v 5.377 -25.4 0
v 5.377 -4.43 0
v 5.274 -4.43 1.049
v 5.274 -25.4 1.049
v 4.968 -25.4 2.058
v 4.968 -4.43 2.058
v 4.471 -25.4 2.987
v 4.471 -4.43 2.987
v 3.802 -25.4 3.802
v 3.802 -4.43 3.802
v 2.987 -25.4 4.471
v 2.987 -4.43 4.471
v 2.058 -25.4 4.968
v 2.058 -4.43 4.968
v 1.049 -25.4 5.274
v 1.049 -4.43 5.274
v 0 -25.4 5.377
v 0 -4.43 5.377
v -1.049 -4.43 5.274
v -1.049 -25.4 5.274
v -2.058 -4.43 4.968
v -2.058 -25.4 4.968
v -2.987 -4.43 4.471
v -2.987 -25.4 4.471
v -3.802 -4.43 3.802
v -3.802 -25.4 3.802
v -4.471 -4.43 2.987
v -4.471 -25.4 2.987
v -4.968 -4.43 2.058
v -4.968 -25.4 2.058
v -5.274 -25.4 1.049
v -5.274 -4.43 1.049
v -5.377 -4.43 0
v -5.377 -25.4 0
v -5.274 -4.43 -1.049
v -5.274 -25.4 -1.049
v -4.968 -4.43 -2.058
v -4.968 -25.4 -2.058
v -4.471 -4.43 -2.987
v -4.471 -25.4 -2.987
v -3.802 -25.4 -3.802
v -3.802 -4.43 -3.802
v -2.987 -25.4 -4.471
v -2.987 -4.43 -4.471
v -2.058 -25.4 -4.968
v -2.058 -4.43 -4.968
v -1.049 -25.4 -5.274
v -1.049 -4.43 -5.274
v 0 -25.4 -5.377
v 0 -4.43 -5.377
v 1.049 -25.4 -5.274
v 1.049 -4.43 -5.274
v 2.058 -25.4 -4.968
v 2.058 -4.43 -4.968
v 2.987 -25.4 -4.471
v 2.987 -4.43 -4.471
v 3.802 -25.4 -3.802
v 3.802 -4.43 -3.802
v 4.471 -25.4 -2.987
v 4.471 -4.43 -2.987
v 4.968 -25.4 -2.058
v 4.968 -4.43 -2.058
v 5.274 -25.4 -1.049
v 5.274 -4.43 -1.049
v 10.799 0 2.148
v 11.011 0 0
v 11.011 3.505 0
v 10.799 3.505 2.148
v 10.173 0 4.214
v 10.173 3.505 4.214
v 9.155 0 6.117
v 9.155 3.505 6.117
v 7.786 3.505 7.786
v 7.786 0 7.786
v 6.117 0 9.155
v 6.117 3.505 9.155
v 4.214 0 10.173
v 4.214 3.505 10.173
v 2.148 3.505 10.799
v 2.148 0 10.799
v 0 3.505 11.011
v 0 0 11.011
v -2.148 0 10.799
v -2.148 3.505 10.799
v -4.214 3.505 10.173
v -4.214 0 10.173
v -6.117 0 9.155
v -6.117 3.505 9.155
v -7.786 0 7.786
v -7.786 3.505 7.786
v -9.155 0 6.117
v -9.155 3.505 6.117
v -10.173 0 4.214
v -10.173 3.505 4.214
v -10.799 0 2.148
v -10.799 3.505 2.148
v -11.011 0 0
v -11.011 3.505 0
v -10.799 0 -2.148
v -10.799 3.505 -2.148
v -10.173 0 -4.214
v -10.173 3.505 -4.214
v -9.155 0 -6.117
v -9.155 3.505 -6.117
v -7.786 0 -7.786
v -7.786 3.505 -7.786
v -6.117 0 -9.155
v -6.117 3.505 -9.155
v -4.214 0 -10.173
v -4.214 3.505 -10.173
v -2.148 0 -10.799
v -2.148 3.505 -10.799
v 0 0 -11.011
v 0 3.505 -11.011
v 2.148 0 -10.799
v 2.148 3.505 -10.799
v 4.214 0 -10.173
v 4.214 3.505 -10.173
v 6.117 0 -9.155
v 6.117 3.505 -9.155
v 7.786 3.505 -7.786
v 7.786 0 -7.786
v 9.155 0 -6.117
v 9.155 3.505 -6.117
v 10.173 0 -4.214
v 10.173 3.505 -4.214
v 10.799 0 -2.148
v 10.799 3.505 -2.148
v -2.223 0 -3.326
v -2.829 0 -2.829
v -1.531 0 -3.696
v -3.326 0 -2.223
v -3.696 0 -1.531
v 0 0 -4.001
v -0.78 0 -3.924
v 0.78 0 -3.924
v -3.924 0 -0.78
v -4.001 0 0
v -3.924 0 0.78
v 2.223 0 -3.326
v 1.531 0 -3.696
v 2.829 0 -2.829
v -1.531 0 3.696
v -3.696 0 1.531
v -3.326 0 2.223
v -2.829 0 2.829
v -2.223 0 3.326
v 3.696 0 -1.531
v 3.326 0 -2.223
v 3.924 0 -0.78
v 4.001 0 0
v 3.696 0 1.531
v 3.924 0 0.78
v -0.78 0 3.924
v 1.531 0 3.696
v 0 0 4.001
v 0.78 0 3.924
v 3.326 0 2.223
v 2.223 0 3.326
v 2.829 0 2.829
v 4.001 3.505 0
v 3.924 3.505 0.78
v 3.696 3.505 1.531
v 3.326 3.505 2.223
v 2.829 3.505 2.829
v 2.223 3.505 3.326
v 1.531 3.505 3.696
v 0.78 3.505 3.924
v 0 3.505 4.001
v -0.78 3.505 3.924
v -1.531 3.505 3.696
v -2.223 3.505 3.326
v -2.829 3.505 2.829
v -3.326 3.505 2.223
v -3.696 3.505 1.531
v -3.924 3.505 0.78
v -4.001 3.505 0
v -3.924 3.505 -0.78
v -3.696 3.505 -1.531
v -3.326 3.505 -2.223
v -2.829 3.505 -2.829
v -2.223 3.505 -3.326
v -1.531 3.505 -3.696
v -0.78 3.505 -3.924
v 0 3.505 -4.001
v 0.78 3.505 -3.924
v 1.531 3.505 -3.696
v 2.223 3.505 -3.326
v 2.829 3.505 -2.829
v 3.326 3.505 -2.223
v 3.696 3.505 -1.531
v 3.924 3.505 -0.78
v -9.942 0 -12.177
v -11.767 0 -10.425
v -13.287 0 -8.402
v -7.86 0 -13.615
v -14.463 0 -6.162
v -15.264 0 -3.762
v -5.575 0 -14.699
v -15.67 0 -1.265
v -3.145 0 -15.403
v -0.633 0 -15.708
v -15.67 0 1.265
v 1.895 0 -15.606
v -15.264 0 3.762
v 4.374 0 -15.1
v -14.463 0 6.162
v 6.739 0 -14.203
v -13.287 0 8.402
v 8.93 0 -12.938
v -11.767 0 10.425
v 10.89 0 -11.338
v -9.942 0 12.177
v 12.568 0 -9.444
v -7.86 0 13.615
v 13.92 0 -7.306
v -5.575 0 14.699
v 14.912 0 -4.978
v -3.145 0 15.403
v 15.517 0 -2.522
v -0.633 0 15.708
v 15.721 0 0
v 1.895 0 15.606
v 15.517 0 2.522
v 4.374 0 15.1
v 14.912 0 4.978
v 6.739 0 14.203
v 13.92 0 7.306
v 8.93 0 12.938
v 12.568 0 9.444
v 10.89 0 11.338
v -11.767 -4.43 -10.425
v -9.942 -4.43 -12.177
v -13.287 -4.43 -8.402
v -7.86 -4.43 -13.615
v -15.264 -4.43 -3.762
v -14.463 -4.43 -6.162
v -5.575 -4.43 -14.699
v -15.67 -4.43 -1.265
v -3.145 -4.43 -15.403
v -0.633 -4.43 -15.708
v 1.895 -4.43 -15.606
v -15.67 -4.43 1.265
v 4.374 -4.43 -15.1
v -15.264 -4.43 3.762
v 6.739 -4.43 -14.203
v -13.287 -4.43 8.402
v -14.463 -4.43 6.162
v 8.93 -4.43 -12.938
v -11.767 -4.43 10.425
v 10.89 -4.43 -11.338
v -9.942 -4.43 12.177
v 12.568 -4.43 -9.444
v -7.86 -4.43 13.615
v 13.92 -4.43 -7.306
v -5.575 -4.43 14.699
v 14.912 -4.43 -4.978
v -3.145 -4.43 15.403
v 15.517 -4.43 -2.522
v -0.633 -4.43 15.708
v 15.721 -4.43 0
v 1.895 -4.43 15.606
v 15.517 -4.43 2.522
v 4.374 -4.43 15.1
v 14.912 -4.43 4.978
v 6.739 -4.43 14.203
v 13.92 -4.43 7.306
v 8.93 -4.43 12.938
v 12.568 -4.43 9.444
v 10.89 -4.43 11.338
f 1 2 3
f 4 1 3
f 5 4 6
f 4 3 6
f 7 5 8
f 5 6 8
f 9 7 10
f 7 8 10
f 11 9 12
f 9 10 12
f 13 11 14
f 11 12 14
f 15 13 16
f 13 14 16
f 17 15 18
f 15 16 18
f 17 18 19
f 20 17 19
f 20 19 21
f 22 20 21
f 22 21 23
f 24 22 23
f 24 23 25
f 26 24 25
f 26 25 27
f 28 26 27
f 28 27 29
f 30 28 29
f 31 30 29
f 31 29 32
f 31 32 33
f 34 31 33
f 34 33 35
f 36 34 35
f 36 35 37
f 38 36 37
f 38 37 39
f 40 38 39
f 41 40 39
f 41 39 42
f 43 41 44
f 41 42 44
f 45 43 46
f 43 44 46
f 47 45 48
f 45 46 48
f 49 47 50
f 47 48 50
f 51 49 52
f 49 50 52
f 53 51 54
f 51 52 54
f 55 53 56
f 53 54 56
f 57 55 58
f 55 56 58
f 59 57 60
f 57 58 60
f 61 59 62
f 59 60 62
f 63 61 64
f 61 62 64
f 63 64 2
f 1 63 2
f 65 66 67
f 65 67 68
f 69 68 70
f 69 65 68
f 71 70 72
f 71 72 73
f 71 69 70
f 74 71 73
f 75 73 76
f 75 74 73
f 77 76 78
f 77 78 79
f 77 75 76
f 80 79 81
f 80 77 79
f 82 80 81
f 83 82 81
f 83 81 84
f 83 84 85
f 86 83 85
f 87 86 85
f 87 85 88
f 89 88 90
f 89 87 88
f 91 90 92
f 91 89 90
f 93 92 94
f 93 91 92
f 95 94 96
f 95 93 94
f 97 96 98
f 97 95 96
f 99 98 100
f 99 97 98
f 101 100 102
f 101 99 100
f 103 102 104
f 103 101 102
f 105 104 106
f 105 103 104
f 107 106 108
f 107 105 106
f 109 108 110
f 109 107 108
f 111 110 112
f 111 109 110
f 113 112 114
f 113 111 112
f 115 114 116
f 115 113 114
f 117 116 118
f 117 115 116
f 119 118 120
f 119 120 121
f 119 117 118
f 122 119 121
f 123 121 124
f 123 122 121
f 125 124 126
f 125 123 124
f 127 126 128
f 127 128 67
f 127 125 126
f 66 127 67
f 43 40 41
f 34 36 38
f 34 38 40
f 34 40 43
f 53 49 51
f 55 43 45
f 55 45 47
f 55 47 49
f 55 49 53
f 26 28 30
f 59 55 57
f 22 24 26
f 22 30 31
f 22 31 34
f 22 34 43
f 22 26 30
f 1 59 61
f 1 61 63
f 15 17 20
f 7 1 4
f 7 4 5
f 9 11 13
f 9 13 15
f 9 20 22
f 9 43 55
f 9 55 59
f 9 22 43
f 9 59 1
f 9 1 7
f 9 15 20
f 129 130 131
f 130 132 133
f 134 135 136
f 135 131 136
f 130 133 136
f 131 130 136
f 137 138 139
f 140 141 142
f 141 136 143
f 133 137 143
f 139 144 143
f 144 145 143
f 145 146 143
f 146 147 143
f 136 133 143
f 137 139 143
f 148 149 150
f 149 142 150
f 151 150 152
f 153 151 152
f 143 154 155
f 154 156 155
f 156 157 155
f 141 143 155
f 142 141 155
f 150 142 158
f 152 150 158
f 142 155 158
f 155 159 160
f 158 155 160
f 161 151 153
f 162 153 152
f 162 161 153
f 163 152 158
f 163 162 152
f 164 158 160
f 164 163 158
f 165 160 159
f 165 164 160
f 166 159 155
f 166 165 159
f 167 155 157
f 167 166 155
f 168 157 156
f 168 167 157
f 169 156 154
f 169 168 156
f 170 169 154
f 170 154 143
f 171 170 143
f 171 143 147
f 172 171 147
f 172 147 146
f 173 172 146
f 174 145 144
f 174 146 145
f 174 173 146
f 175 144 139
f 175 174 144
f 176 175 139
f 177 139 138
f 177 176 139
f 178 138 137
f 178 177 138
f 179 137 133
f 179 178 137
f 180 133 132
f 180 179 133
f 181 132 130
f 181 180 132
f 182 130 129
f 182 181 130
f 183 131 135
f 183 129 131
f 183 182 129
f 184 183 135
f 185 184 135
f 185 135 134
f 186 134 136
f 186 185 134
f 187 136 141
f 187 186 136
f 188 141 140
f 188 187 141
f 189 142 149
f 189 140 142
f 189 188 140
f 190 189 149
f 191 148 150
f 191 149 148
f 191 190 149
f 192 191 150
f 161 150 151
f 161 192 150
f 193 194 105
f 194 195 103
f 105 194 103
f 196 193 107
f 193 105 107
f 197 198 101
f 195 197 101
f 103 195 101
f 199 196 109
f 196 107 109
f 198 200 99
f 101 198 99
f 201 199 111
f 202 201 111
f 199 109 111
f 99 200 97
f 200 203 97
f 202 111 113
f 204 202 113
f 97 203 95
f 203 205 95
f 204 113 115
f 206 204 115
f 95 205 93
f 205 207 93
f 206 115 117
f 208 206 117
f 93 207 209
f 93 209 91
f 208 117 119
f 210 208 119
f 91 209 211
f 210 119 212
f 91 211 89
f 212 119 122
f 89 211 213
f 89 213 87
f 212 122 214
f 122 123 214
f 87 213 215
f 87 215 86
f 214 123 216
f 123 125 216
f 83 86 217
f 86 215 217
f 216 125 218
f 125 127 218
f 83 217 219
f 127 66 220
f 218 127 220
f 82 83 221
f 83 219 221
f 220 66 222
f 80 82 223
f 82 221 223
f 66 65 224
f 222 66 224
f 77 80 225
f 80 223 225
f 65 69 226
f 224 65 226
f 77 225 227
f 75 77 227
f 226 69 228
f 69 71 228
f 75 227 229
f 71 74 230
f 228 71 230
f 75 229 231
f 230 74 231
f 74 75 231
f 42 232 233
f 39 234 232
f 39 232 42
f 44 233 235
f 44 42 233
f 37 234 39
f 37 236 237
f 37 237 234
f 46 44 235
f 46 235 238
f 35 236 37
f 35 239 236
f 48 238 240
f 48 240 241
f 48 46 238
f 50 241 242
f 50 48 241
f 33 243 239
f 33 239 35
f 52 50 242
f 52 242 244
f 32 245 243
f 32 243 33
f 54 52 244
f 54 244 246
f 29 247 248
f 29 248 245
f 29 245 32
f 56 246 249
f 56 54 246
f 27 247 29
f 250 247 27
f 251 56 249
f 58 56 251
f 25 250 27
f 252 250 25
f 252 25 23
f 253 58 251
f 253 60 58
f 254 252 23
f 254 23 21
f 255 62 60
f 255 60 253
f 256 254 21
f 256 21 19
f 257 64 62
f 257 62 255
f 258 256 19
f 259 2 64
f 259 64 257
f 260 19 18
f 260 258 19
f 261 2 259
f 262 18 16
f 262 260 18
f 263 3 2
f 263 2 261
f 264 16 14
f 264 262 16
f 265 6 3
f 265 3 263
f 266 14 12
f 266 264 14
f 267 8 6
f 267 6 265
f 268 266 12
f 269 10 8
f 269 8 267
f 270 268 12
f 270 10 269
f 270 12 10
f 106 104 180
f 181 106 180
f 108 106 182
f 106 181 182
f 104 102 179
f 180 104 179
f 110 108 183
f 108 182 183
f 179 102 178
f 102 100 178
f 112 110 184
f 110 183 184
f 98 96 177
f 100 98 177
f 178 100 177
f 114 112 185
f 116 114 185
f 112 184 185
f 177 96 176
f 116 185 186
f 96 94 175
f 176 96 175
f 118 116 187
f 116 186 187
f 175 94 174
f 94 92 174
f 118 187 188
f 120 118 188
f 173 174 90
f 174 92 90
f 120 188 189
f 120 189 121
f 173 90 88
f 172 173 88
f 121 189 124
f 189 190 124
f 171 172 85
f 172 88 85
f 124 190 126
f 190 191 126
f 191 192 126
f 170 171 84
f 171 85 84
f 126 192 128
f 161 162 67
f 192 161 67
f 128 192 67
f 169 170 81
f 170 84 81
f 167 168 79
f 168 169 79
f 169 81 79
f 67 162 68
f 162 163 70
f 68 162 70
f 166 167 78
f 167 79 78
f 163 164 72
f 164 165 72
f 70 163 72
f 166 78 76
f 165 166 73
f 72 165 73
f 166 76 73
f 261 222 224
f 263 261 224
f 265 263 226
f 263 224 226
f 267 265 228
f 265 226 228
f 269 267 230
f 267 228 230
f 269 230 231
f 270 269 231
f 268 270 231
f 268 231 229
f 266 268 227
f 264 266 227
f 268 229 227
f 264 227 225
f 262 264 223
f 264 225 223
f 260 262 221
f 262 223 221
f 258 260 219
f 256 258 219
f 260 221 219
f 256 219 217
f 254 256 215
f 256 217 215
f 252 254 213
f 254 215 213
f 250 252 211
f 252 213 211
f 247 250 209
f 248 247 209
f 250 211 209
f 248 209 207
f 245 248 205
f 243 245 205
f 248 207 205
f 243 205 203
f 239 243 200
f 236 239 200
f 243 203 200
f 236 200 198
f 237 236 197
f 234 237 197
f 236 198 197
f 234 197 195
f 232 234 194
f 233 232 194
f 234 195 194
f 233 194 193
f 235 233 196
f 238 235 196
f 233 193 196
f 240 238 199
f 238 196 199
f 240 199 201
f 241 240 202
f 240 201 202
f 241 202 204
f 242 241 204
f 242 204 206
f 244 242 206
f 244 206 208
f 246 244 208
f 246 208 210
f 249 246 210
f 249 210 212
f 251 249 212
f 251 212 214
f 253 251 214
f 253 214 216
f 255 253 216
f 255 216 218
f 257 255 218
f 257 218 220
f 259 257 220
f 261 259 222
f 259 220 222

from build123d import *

# Parameters (mm, degrees)
F0_R     = 11.0109
F0_R_2   = 4.0005284671
F1_DEPTH = 3.5052
F2_R     = 15.7206731231
F3_DEPTH = 4.43
F4_R     = 5.3773289571
F5_DEPTH = 25.4


with BuildPart() as f1:
    # F0 (on Front) → F1 (new body, symmetric)
    with BuildSketch(Plane.XZ):
        Circle(F0_R)
        Circle(F0_R_2, mode=Mode.SUBTRACT)
    extrude(amount=F1_DEPTH, both=True)

    # F2 (on Front) → F3 (join)
    with BuildSketch(Plane.XZ):
        Circle(F2_R)
    extrude(amount=F3_DEPTH)

    # F4 (on Front) → F5 (join)
    with BuildSketch(Plane.XZ):
        Circle(F4_R)
    extrude(amount=F5_DEPTH)


solid = f1.part
